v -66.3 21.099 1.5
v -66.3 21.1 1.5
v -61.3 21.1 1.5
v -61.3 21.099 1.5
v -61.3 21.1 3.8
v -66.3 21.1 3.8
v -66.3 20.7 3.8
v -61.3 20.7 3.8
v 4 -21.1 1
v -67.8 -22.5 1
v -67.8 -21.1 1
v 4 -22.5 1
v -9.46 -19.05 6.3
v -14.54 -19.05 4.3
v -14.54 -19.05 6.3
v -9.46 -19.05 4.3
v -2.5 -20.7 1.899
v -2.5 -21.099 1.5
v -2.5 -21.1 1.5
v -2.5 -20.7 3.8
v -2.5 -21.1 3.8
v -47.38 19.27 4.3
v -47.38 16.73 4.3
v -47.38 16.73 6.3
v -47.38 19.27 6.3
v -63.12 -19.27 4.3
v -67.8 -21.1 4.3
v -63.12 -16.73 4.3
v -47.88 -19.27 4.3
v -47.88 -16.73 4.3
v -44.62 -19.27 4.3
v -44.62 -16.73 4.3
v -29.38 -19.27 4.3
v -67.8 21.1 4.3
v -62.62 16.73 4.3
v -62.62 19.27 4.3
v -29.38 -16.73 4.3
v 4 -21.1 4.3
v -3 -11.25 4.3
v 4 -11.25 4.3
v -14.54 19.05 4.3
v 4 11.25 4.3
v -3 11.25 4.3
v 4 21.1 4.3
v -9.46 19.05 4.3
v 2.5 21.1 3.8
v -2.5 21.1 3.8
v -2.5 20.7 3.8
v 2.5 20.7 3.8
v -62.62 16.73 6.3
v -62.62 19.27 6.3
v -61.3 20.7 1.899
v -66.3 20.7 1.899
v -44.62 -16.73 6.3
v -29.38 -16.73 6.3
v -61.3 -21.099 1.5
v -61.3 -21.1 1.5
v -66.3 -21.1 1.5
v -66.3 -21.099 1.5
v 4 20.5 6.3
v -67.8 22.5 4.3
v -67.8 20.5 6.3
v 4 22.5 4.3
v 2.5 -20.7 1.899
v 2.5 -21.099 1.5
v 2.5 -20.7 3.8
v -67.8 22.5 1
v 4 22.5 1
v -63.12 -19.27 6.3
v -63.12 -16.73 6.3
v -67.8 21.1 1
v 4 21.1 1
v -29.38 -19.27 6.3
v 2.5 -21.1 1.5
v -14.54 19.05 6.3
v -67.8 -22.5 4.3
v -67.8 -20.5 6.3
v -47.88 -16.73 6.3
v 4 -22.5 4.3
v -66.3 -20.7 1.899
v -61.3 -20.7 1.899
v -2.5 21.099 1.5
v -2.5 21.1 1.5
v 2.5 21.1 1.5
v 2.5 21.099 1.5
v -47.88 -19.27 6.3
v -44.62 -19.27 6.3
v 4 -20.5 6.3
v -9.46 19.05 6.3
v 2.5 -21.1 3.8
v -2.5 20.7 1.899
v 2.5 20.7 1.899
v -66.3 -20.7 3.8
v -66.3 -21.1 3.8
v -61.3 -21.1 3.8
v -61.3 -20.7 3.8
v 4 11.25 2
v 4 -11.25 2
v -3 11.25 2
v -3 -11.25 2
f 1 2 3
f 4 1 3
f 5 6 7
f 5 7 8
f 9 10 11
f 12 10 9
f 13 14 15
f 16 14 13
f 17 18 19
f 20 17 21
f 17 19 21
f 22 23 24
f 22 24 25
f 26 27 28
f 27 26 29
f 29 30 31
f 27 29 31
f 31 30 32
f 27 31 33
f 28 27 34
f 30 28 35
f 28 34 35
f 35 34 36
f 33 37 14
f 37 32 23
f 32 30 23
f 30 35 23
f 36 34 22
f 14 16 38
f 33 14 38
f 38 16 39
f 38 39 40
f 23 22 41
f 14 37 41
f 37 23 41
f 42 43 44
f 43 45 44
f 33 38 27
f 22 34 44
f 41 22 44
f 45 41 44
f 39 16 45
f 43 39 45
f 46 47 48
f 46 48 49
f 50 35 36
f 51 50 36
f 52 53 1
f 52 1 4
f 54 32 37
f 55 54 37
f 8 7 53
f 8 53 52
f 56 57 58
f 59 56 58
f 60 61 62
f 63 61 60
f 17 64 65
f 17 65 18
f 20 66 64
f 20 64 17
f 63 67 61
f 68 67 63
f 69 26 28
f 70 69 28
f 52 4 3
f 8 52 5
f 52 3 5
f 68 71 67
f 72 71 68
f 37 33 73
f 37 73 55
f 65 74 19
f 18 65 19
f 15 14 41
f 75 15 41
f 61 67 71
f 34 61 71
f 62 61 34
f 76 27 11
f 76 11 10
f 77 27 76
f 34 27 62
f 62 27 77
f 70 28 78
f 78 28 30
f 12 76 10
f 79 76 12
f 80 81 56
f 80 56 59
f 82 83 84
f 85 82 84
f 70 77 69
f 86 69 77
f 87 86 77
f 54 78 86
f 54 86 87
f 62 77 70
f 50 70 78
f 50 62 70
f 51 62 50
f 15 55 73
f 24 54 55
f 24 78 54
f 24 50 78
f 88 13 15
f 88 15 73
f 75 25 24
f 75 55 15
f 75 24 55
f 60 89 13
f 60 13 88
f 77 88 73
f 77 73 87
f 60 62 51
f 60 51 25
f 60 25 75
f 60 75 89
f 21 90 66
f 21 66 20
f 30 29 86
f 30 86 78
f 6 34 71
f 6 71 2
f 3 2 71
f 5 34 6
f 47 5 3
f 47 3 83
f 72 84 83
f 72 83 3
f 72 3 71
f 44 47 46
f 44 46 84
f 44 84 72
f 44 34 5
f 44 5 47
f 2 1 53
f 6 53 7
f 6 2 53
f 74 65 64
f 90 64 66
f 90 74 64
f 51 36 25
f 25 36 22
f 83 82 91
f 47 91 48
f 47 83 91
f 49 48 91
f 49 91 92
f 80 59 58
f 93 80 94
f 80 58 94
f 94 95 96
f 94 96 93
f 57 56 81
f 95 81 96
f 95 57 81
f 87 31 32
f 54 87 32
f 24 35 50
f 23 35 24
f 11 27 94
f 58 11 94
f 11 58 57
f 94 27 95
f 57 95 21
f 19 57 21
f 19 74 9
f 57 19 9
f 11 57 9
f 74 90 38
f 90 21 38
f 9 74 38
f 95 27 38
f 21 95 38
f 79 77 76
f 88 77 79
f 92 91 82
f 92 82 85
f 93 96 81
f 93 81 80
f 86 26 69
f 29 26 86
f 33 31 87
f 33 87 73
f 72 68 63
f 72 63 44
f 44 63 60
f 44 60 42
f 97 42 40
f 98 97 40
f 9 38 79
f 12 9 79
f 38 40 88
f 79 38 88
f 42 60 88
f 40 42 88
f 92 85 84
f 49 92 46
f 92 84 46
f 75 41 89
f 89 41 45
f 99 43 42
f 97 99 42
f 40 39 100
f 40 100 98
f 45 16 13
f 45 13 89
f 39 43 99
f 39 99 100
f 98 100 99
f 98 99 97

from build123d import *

# Parameters (mm, degrees)
SKETCH005_W     = 71.8
SKETCH005_H     = 45
SKETCH005_W_2   = 15.24
SKETCH005_H_2   = 2.54
SKETCH005_W_3   = 5.08
SKETCH005_H_3   = 38.1
PAD003_DEPTH    = 2
SKETCH006_W     = 71.8
SKETCH006_H     = 1.4
PAD004_DEPTH    = 3.3
SKETCH007_W     = 7
SKETCH007_H     = 22.5
PAD005_DEPTH    = 2.3
SKETCH010_W     = 5
SKETCH010_H     = 2.3
PAD006_DEPTH    = 0.4
SKETCH011_W     = 5
SKETCH011_H     = 2.3
PAD007_DEPTH    = 0.4
CHAMFER_SIZE    = 0.399
CHAMFER001_SIZE = 2


with BuildPart() as part:
    # Sketch005 → Pad003 (new body)
    with BuildSketch(Plane.XY.offset(4.3)):
        with Locations((-31.9, 0)):
            Rectangle(SKETCH005_W, SKETCH005_H)
        with Locations((-55, 18)):
            Rectangle(SKETCH005_W_2, SKETCH005_H_2, mode=Mode.SUBTRACT)
        with Locations((-55.5, -18)):
            Rectangle(SKETCH005_W_2, SKETCH005_H_2, mode=Mode.SUBTRACT)
        with Locations((-37, -18)):
            Rectangle(SKETCH005_W_2, SKETCH005_H_2, mode=Mode.SUBTRACT)
        with Locations((-12, 0)):
            Rectangle(SKETCH005_W_3, SKETCH005_H_3, mode=Mode.SUBTRACT)
    extrude(amount=PAD003_DEPTH)

    # Sketch006 (on Face21 of Pad003) → Pad004 (join)
    with BuildSketch(Plane(origin=(0, 0, 4.3), x_dir=(1, 0, 0), z_dir=(0, 0, -1))):
        with Locations((-31.9, 21.8)):
            Rectangle(SKETCH006_W, SKETCH006_H)
        with Locations((-31.9, -21.8)):
            Rectangle(SKETCH006_W, SKETCH006_H)
    extrude(amount=PAD004_DEPTH)

    # Sketch007 (on Face5 of Pad004) → Pad005 (join)
    with BuildSketch(Plane(origin=(0, 0, 4.3), x_dir=(1, 0, 0), z_dir=(0, 0, -1))):
        with Locations((0.5, 0)):
            Rectangle(SKETCH007_W, SKETCH007_H)
    extrude(amount=PAD005_DEPTH)

    # Sketch010 (on Face11 of Pad005) → Pad006 (join)
    with BuildSketch(Plane.XZ.offset(-21.1)):
        with Locations((0, 2.65)):
            Rectangle(SKETCH010_W, SKETCH010_H)
        with Locations((-63.8, 2.65)):
            Rectangle(SKETCH010_W, SKETCH010_H)
    extrude(amount=PAD006_DEPTH)

    # Sketch011 (on Face16 of Pad006) → Pad007 (join)
    with BuildSketch(Plane(origin=(0, -21.1, 0), x_dir=(-1, 0, 0), z_dir=(0, 1, 0))):
        with Locations((0, 2.65)):
            Rectangle(SKETCH011_W, SKETCH011_H)
        with Locations((63.8, 2.65)):
            Rectangle(SKETCH011_W, SKETCH011_H)
    extrude(amount=PAD007_DEPTH)

    # Chamfer
    chamfer_edges = [part.edges().sort_by_distance(p)[0] for p in [
        (-63.8, -20.7, 1.5),
        (0, -20.7, 1.5),
        (-63.8, 20.7, 1.5),
        (0, 20.7, 1.5),
    ]]
    chamfer(chamfer_edges, length=CHAMFER_SIZE)

    # Chamfer001
    chamfer001_edges = [part.edges().sort_by_distance(p)[0] for p in [
        (-31.9, 22.5, 6.3),
        (-31.9, -22.5, 6.3),
    ]]
    chamfer(chamfer001_edges, length=CHAMFER001_SIZE)


solid = part.part
